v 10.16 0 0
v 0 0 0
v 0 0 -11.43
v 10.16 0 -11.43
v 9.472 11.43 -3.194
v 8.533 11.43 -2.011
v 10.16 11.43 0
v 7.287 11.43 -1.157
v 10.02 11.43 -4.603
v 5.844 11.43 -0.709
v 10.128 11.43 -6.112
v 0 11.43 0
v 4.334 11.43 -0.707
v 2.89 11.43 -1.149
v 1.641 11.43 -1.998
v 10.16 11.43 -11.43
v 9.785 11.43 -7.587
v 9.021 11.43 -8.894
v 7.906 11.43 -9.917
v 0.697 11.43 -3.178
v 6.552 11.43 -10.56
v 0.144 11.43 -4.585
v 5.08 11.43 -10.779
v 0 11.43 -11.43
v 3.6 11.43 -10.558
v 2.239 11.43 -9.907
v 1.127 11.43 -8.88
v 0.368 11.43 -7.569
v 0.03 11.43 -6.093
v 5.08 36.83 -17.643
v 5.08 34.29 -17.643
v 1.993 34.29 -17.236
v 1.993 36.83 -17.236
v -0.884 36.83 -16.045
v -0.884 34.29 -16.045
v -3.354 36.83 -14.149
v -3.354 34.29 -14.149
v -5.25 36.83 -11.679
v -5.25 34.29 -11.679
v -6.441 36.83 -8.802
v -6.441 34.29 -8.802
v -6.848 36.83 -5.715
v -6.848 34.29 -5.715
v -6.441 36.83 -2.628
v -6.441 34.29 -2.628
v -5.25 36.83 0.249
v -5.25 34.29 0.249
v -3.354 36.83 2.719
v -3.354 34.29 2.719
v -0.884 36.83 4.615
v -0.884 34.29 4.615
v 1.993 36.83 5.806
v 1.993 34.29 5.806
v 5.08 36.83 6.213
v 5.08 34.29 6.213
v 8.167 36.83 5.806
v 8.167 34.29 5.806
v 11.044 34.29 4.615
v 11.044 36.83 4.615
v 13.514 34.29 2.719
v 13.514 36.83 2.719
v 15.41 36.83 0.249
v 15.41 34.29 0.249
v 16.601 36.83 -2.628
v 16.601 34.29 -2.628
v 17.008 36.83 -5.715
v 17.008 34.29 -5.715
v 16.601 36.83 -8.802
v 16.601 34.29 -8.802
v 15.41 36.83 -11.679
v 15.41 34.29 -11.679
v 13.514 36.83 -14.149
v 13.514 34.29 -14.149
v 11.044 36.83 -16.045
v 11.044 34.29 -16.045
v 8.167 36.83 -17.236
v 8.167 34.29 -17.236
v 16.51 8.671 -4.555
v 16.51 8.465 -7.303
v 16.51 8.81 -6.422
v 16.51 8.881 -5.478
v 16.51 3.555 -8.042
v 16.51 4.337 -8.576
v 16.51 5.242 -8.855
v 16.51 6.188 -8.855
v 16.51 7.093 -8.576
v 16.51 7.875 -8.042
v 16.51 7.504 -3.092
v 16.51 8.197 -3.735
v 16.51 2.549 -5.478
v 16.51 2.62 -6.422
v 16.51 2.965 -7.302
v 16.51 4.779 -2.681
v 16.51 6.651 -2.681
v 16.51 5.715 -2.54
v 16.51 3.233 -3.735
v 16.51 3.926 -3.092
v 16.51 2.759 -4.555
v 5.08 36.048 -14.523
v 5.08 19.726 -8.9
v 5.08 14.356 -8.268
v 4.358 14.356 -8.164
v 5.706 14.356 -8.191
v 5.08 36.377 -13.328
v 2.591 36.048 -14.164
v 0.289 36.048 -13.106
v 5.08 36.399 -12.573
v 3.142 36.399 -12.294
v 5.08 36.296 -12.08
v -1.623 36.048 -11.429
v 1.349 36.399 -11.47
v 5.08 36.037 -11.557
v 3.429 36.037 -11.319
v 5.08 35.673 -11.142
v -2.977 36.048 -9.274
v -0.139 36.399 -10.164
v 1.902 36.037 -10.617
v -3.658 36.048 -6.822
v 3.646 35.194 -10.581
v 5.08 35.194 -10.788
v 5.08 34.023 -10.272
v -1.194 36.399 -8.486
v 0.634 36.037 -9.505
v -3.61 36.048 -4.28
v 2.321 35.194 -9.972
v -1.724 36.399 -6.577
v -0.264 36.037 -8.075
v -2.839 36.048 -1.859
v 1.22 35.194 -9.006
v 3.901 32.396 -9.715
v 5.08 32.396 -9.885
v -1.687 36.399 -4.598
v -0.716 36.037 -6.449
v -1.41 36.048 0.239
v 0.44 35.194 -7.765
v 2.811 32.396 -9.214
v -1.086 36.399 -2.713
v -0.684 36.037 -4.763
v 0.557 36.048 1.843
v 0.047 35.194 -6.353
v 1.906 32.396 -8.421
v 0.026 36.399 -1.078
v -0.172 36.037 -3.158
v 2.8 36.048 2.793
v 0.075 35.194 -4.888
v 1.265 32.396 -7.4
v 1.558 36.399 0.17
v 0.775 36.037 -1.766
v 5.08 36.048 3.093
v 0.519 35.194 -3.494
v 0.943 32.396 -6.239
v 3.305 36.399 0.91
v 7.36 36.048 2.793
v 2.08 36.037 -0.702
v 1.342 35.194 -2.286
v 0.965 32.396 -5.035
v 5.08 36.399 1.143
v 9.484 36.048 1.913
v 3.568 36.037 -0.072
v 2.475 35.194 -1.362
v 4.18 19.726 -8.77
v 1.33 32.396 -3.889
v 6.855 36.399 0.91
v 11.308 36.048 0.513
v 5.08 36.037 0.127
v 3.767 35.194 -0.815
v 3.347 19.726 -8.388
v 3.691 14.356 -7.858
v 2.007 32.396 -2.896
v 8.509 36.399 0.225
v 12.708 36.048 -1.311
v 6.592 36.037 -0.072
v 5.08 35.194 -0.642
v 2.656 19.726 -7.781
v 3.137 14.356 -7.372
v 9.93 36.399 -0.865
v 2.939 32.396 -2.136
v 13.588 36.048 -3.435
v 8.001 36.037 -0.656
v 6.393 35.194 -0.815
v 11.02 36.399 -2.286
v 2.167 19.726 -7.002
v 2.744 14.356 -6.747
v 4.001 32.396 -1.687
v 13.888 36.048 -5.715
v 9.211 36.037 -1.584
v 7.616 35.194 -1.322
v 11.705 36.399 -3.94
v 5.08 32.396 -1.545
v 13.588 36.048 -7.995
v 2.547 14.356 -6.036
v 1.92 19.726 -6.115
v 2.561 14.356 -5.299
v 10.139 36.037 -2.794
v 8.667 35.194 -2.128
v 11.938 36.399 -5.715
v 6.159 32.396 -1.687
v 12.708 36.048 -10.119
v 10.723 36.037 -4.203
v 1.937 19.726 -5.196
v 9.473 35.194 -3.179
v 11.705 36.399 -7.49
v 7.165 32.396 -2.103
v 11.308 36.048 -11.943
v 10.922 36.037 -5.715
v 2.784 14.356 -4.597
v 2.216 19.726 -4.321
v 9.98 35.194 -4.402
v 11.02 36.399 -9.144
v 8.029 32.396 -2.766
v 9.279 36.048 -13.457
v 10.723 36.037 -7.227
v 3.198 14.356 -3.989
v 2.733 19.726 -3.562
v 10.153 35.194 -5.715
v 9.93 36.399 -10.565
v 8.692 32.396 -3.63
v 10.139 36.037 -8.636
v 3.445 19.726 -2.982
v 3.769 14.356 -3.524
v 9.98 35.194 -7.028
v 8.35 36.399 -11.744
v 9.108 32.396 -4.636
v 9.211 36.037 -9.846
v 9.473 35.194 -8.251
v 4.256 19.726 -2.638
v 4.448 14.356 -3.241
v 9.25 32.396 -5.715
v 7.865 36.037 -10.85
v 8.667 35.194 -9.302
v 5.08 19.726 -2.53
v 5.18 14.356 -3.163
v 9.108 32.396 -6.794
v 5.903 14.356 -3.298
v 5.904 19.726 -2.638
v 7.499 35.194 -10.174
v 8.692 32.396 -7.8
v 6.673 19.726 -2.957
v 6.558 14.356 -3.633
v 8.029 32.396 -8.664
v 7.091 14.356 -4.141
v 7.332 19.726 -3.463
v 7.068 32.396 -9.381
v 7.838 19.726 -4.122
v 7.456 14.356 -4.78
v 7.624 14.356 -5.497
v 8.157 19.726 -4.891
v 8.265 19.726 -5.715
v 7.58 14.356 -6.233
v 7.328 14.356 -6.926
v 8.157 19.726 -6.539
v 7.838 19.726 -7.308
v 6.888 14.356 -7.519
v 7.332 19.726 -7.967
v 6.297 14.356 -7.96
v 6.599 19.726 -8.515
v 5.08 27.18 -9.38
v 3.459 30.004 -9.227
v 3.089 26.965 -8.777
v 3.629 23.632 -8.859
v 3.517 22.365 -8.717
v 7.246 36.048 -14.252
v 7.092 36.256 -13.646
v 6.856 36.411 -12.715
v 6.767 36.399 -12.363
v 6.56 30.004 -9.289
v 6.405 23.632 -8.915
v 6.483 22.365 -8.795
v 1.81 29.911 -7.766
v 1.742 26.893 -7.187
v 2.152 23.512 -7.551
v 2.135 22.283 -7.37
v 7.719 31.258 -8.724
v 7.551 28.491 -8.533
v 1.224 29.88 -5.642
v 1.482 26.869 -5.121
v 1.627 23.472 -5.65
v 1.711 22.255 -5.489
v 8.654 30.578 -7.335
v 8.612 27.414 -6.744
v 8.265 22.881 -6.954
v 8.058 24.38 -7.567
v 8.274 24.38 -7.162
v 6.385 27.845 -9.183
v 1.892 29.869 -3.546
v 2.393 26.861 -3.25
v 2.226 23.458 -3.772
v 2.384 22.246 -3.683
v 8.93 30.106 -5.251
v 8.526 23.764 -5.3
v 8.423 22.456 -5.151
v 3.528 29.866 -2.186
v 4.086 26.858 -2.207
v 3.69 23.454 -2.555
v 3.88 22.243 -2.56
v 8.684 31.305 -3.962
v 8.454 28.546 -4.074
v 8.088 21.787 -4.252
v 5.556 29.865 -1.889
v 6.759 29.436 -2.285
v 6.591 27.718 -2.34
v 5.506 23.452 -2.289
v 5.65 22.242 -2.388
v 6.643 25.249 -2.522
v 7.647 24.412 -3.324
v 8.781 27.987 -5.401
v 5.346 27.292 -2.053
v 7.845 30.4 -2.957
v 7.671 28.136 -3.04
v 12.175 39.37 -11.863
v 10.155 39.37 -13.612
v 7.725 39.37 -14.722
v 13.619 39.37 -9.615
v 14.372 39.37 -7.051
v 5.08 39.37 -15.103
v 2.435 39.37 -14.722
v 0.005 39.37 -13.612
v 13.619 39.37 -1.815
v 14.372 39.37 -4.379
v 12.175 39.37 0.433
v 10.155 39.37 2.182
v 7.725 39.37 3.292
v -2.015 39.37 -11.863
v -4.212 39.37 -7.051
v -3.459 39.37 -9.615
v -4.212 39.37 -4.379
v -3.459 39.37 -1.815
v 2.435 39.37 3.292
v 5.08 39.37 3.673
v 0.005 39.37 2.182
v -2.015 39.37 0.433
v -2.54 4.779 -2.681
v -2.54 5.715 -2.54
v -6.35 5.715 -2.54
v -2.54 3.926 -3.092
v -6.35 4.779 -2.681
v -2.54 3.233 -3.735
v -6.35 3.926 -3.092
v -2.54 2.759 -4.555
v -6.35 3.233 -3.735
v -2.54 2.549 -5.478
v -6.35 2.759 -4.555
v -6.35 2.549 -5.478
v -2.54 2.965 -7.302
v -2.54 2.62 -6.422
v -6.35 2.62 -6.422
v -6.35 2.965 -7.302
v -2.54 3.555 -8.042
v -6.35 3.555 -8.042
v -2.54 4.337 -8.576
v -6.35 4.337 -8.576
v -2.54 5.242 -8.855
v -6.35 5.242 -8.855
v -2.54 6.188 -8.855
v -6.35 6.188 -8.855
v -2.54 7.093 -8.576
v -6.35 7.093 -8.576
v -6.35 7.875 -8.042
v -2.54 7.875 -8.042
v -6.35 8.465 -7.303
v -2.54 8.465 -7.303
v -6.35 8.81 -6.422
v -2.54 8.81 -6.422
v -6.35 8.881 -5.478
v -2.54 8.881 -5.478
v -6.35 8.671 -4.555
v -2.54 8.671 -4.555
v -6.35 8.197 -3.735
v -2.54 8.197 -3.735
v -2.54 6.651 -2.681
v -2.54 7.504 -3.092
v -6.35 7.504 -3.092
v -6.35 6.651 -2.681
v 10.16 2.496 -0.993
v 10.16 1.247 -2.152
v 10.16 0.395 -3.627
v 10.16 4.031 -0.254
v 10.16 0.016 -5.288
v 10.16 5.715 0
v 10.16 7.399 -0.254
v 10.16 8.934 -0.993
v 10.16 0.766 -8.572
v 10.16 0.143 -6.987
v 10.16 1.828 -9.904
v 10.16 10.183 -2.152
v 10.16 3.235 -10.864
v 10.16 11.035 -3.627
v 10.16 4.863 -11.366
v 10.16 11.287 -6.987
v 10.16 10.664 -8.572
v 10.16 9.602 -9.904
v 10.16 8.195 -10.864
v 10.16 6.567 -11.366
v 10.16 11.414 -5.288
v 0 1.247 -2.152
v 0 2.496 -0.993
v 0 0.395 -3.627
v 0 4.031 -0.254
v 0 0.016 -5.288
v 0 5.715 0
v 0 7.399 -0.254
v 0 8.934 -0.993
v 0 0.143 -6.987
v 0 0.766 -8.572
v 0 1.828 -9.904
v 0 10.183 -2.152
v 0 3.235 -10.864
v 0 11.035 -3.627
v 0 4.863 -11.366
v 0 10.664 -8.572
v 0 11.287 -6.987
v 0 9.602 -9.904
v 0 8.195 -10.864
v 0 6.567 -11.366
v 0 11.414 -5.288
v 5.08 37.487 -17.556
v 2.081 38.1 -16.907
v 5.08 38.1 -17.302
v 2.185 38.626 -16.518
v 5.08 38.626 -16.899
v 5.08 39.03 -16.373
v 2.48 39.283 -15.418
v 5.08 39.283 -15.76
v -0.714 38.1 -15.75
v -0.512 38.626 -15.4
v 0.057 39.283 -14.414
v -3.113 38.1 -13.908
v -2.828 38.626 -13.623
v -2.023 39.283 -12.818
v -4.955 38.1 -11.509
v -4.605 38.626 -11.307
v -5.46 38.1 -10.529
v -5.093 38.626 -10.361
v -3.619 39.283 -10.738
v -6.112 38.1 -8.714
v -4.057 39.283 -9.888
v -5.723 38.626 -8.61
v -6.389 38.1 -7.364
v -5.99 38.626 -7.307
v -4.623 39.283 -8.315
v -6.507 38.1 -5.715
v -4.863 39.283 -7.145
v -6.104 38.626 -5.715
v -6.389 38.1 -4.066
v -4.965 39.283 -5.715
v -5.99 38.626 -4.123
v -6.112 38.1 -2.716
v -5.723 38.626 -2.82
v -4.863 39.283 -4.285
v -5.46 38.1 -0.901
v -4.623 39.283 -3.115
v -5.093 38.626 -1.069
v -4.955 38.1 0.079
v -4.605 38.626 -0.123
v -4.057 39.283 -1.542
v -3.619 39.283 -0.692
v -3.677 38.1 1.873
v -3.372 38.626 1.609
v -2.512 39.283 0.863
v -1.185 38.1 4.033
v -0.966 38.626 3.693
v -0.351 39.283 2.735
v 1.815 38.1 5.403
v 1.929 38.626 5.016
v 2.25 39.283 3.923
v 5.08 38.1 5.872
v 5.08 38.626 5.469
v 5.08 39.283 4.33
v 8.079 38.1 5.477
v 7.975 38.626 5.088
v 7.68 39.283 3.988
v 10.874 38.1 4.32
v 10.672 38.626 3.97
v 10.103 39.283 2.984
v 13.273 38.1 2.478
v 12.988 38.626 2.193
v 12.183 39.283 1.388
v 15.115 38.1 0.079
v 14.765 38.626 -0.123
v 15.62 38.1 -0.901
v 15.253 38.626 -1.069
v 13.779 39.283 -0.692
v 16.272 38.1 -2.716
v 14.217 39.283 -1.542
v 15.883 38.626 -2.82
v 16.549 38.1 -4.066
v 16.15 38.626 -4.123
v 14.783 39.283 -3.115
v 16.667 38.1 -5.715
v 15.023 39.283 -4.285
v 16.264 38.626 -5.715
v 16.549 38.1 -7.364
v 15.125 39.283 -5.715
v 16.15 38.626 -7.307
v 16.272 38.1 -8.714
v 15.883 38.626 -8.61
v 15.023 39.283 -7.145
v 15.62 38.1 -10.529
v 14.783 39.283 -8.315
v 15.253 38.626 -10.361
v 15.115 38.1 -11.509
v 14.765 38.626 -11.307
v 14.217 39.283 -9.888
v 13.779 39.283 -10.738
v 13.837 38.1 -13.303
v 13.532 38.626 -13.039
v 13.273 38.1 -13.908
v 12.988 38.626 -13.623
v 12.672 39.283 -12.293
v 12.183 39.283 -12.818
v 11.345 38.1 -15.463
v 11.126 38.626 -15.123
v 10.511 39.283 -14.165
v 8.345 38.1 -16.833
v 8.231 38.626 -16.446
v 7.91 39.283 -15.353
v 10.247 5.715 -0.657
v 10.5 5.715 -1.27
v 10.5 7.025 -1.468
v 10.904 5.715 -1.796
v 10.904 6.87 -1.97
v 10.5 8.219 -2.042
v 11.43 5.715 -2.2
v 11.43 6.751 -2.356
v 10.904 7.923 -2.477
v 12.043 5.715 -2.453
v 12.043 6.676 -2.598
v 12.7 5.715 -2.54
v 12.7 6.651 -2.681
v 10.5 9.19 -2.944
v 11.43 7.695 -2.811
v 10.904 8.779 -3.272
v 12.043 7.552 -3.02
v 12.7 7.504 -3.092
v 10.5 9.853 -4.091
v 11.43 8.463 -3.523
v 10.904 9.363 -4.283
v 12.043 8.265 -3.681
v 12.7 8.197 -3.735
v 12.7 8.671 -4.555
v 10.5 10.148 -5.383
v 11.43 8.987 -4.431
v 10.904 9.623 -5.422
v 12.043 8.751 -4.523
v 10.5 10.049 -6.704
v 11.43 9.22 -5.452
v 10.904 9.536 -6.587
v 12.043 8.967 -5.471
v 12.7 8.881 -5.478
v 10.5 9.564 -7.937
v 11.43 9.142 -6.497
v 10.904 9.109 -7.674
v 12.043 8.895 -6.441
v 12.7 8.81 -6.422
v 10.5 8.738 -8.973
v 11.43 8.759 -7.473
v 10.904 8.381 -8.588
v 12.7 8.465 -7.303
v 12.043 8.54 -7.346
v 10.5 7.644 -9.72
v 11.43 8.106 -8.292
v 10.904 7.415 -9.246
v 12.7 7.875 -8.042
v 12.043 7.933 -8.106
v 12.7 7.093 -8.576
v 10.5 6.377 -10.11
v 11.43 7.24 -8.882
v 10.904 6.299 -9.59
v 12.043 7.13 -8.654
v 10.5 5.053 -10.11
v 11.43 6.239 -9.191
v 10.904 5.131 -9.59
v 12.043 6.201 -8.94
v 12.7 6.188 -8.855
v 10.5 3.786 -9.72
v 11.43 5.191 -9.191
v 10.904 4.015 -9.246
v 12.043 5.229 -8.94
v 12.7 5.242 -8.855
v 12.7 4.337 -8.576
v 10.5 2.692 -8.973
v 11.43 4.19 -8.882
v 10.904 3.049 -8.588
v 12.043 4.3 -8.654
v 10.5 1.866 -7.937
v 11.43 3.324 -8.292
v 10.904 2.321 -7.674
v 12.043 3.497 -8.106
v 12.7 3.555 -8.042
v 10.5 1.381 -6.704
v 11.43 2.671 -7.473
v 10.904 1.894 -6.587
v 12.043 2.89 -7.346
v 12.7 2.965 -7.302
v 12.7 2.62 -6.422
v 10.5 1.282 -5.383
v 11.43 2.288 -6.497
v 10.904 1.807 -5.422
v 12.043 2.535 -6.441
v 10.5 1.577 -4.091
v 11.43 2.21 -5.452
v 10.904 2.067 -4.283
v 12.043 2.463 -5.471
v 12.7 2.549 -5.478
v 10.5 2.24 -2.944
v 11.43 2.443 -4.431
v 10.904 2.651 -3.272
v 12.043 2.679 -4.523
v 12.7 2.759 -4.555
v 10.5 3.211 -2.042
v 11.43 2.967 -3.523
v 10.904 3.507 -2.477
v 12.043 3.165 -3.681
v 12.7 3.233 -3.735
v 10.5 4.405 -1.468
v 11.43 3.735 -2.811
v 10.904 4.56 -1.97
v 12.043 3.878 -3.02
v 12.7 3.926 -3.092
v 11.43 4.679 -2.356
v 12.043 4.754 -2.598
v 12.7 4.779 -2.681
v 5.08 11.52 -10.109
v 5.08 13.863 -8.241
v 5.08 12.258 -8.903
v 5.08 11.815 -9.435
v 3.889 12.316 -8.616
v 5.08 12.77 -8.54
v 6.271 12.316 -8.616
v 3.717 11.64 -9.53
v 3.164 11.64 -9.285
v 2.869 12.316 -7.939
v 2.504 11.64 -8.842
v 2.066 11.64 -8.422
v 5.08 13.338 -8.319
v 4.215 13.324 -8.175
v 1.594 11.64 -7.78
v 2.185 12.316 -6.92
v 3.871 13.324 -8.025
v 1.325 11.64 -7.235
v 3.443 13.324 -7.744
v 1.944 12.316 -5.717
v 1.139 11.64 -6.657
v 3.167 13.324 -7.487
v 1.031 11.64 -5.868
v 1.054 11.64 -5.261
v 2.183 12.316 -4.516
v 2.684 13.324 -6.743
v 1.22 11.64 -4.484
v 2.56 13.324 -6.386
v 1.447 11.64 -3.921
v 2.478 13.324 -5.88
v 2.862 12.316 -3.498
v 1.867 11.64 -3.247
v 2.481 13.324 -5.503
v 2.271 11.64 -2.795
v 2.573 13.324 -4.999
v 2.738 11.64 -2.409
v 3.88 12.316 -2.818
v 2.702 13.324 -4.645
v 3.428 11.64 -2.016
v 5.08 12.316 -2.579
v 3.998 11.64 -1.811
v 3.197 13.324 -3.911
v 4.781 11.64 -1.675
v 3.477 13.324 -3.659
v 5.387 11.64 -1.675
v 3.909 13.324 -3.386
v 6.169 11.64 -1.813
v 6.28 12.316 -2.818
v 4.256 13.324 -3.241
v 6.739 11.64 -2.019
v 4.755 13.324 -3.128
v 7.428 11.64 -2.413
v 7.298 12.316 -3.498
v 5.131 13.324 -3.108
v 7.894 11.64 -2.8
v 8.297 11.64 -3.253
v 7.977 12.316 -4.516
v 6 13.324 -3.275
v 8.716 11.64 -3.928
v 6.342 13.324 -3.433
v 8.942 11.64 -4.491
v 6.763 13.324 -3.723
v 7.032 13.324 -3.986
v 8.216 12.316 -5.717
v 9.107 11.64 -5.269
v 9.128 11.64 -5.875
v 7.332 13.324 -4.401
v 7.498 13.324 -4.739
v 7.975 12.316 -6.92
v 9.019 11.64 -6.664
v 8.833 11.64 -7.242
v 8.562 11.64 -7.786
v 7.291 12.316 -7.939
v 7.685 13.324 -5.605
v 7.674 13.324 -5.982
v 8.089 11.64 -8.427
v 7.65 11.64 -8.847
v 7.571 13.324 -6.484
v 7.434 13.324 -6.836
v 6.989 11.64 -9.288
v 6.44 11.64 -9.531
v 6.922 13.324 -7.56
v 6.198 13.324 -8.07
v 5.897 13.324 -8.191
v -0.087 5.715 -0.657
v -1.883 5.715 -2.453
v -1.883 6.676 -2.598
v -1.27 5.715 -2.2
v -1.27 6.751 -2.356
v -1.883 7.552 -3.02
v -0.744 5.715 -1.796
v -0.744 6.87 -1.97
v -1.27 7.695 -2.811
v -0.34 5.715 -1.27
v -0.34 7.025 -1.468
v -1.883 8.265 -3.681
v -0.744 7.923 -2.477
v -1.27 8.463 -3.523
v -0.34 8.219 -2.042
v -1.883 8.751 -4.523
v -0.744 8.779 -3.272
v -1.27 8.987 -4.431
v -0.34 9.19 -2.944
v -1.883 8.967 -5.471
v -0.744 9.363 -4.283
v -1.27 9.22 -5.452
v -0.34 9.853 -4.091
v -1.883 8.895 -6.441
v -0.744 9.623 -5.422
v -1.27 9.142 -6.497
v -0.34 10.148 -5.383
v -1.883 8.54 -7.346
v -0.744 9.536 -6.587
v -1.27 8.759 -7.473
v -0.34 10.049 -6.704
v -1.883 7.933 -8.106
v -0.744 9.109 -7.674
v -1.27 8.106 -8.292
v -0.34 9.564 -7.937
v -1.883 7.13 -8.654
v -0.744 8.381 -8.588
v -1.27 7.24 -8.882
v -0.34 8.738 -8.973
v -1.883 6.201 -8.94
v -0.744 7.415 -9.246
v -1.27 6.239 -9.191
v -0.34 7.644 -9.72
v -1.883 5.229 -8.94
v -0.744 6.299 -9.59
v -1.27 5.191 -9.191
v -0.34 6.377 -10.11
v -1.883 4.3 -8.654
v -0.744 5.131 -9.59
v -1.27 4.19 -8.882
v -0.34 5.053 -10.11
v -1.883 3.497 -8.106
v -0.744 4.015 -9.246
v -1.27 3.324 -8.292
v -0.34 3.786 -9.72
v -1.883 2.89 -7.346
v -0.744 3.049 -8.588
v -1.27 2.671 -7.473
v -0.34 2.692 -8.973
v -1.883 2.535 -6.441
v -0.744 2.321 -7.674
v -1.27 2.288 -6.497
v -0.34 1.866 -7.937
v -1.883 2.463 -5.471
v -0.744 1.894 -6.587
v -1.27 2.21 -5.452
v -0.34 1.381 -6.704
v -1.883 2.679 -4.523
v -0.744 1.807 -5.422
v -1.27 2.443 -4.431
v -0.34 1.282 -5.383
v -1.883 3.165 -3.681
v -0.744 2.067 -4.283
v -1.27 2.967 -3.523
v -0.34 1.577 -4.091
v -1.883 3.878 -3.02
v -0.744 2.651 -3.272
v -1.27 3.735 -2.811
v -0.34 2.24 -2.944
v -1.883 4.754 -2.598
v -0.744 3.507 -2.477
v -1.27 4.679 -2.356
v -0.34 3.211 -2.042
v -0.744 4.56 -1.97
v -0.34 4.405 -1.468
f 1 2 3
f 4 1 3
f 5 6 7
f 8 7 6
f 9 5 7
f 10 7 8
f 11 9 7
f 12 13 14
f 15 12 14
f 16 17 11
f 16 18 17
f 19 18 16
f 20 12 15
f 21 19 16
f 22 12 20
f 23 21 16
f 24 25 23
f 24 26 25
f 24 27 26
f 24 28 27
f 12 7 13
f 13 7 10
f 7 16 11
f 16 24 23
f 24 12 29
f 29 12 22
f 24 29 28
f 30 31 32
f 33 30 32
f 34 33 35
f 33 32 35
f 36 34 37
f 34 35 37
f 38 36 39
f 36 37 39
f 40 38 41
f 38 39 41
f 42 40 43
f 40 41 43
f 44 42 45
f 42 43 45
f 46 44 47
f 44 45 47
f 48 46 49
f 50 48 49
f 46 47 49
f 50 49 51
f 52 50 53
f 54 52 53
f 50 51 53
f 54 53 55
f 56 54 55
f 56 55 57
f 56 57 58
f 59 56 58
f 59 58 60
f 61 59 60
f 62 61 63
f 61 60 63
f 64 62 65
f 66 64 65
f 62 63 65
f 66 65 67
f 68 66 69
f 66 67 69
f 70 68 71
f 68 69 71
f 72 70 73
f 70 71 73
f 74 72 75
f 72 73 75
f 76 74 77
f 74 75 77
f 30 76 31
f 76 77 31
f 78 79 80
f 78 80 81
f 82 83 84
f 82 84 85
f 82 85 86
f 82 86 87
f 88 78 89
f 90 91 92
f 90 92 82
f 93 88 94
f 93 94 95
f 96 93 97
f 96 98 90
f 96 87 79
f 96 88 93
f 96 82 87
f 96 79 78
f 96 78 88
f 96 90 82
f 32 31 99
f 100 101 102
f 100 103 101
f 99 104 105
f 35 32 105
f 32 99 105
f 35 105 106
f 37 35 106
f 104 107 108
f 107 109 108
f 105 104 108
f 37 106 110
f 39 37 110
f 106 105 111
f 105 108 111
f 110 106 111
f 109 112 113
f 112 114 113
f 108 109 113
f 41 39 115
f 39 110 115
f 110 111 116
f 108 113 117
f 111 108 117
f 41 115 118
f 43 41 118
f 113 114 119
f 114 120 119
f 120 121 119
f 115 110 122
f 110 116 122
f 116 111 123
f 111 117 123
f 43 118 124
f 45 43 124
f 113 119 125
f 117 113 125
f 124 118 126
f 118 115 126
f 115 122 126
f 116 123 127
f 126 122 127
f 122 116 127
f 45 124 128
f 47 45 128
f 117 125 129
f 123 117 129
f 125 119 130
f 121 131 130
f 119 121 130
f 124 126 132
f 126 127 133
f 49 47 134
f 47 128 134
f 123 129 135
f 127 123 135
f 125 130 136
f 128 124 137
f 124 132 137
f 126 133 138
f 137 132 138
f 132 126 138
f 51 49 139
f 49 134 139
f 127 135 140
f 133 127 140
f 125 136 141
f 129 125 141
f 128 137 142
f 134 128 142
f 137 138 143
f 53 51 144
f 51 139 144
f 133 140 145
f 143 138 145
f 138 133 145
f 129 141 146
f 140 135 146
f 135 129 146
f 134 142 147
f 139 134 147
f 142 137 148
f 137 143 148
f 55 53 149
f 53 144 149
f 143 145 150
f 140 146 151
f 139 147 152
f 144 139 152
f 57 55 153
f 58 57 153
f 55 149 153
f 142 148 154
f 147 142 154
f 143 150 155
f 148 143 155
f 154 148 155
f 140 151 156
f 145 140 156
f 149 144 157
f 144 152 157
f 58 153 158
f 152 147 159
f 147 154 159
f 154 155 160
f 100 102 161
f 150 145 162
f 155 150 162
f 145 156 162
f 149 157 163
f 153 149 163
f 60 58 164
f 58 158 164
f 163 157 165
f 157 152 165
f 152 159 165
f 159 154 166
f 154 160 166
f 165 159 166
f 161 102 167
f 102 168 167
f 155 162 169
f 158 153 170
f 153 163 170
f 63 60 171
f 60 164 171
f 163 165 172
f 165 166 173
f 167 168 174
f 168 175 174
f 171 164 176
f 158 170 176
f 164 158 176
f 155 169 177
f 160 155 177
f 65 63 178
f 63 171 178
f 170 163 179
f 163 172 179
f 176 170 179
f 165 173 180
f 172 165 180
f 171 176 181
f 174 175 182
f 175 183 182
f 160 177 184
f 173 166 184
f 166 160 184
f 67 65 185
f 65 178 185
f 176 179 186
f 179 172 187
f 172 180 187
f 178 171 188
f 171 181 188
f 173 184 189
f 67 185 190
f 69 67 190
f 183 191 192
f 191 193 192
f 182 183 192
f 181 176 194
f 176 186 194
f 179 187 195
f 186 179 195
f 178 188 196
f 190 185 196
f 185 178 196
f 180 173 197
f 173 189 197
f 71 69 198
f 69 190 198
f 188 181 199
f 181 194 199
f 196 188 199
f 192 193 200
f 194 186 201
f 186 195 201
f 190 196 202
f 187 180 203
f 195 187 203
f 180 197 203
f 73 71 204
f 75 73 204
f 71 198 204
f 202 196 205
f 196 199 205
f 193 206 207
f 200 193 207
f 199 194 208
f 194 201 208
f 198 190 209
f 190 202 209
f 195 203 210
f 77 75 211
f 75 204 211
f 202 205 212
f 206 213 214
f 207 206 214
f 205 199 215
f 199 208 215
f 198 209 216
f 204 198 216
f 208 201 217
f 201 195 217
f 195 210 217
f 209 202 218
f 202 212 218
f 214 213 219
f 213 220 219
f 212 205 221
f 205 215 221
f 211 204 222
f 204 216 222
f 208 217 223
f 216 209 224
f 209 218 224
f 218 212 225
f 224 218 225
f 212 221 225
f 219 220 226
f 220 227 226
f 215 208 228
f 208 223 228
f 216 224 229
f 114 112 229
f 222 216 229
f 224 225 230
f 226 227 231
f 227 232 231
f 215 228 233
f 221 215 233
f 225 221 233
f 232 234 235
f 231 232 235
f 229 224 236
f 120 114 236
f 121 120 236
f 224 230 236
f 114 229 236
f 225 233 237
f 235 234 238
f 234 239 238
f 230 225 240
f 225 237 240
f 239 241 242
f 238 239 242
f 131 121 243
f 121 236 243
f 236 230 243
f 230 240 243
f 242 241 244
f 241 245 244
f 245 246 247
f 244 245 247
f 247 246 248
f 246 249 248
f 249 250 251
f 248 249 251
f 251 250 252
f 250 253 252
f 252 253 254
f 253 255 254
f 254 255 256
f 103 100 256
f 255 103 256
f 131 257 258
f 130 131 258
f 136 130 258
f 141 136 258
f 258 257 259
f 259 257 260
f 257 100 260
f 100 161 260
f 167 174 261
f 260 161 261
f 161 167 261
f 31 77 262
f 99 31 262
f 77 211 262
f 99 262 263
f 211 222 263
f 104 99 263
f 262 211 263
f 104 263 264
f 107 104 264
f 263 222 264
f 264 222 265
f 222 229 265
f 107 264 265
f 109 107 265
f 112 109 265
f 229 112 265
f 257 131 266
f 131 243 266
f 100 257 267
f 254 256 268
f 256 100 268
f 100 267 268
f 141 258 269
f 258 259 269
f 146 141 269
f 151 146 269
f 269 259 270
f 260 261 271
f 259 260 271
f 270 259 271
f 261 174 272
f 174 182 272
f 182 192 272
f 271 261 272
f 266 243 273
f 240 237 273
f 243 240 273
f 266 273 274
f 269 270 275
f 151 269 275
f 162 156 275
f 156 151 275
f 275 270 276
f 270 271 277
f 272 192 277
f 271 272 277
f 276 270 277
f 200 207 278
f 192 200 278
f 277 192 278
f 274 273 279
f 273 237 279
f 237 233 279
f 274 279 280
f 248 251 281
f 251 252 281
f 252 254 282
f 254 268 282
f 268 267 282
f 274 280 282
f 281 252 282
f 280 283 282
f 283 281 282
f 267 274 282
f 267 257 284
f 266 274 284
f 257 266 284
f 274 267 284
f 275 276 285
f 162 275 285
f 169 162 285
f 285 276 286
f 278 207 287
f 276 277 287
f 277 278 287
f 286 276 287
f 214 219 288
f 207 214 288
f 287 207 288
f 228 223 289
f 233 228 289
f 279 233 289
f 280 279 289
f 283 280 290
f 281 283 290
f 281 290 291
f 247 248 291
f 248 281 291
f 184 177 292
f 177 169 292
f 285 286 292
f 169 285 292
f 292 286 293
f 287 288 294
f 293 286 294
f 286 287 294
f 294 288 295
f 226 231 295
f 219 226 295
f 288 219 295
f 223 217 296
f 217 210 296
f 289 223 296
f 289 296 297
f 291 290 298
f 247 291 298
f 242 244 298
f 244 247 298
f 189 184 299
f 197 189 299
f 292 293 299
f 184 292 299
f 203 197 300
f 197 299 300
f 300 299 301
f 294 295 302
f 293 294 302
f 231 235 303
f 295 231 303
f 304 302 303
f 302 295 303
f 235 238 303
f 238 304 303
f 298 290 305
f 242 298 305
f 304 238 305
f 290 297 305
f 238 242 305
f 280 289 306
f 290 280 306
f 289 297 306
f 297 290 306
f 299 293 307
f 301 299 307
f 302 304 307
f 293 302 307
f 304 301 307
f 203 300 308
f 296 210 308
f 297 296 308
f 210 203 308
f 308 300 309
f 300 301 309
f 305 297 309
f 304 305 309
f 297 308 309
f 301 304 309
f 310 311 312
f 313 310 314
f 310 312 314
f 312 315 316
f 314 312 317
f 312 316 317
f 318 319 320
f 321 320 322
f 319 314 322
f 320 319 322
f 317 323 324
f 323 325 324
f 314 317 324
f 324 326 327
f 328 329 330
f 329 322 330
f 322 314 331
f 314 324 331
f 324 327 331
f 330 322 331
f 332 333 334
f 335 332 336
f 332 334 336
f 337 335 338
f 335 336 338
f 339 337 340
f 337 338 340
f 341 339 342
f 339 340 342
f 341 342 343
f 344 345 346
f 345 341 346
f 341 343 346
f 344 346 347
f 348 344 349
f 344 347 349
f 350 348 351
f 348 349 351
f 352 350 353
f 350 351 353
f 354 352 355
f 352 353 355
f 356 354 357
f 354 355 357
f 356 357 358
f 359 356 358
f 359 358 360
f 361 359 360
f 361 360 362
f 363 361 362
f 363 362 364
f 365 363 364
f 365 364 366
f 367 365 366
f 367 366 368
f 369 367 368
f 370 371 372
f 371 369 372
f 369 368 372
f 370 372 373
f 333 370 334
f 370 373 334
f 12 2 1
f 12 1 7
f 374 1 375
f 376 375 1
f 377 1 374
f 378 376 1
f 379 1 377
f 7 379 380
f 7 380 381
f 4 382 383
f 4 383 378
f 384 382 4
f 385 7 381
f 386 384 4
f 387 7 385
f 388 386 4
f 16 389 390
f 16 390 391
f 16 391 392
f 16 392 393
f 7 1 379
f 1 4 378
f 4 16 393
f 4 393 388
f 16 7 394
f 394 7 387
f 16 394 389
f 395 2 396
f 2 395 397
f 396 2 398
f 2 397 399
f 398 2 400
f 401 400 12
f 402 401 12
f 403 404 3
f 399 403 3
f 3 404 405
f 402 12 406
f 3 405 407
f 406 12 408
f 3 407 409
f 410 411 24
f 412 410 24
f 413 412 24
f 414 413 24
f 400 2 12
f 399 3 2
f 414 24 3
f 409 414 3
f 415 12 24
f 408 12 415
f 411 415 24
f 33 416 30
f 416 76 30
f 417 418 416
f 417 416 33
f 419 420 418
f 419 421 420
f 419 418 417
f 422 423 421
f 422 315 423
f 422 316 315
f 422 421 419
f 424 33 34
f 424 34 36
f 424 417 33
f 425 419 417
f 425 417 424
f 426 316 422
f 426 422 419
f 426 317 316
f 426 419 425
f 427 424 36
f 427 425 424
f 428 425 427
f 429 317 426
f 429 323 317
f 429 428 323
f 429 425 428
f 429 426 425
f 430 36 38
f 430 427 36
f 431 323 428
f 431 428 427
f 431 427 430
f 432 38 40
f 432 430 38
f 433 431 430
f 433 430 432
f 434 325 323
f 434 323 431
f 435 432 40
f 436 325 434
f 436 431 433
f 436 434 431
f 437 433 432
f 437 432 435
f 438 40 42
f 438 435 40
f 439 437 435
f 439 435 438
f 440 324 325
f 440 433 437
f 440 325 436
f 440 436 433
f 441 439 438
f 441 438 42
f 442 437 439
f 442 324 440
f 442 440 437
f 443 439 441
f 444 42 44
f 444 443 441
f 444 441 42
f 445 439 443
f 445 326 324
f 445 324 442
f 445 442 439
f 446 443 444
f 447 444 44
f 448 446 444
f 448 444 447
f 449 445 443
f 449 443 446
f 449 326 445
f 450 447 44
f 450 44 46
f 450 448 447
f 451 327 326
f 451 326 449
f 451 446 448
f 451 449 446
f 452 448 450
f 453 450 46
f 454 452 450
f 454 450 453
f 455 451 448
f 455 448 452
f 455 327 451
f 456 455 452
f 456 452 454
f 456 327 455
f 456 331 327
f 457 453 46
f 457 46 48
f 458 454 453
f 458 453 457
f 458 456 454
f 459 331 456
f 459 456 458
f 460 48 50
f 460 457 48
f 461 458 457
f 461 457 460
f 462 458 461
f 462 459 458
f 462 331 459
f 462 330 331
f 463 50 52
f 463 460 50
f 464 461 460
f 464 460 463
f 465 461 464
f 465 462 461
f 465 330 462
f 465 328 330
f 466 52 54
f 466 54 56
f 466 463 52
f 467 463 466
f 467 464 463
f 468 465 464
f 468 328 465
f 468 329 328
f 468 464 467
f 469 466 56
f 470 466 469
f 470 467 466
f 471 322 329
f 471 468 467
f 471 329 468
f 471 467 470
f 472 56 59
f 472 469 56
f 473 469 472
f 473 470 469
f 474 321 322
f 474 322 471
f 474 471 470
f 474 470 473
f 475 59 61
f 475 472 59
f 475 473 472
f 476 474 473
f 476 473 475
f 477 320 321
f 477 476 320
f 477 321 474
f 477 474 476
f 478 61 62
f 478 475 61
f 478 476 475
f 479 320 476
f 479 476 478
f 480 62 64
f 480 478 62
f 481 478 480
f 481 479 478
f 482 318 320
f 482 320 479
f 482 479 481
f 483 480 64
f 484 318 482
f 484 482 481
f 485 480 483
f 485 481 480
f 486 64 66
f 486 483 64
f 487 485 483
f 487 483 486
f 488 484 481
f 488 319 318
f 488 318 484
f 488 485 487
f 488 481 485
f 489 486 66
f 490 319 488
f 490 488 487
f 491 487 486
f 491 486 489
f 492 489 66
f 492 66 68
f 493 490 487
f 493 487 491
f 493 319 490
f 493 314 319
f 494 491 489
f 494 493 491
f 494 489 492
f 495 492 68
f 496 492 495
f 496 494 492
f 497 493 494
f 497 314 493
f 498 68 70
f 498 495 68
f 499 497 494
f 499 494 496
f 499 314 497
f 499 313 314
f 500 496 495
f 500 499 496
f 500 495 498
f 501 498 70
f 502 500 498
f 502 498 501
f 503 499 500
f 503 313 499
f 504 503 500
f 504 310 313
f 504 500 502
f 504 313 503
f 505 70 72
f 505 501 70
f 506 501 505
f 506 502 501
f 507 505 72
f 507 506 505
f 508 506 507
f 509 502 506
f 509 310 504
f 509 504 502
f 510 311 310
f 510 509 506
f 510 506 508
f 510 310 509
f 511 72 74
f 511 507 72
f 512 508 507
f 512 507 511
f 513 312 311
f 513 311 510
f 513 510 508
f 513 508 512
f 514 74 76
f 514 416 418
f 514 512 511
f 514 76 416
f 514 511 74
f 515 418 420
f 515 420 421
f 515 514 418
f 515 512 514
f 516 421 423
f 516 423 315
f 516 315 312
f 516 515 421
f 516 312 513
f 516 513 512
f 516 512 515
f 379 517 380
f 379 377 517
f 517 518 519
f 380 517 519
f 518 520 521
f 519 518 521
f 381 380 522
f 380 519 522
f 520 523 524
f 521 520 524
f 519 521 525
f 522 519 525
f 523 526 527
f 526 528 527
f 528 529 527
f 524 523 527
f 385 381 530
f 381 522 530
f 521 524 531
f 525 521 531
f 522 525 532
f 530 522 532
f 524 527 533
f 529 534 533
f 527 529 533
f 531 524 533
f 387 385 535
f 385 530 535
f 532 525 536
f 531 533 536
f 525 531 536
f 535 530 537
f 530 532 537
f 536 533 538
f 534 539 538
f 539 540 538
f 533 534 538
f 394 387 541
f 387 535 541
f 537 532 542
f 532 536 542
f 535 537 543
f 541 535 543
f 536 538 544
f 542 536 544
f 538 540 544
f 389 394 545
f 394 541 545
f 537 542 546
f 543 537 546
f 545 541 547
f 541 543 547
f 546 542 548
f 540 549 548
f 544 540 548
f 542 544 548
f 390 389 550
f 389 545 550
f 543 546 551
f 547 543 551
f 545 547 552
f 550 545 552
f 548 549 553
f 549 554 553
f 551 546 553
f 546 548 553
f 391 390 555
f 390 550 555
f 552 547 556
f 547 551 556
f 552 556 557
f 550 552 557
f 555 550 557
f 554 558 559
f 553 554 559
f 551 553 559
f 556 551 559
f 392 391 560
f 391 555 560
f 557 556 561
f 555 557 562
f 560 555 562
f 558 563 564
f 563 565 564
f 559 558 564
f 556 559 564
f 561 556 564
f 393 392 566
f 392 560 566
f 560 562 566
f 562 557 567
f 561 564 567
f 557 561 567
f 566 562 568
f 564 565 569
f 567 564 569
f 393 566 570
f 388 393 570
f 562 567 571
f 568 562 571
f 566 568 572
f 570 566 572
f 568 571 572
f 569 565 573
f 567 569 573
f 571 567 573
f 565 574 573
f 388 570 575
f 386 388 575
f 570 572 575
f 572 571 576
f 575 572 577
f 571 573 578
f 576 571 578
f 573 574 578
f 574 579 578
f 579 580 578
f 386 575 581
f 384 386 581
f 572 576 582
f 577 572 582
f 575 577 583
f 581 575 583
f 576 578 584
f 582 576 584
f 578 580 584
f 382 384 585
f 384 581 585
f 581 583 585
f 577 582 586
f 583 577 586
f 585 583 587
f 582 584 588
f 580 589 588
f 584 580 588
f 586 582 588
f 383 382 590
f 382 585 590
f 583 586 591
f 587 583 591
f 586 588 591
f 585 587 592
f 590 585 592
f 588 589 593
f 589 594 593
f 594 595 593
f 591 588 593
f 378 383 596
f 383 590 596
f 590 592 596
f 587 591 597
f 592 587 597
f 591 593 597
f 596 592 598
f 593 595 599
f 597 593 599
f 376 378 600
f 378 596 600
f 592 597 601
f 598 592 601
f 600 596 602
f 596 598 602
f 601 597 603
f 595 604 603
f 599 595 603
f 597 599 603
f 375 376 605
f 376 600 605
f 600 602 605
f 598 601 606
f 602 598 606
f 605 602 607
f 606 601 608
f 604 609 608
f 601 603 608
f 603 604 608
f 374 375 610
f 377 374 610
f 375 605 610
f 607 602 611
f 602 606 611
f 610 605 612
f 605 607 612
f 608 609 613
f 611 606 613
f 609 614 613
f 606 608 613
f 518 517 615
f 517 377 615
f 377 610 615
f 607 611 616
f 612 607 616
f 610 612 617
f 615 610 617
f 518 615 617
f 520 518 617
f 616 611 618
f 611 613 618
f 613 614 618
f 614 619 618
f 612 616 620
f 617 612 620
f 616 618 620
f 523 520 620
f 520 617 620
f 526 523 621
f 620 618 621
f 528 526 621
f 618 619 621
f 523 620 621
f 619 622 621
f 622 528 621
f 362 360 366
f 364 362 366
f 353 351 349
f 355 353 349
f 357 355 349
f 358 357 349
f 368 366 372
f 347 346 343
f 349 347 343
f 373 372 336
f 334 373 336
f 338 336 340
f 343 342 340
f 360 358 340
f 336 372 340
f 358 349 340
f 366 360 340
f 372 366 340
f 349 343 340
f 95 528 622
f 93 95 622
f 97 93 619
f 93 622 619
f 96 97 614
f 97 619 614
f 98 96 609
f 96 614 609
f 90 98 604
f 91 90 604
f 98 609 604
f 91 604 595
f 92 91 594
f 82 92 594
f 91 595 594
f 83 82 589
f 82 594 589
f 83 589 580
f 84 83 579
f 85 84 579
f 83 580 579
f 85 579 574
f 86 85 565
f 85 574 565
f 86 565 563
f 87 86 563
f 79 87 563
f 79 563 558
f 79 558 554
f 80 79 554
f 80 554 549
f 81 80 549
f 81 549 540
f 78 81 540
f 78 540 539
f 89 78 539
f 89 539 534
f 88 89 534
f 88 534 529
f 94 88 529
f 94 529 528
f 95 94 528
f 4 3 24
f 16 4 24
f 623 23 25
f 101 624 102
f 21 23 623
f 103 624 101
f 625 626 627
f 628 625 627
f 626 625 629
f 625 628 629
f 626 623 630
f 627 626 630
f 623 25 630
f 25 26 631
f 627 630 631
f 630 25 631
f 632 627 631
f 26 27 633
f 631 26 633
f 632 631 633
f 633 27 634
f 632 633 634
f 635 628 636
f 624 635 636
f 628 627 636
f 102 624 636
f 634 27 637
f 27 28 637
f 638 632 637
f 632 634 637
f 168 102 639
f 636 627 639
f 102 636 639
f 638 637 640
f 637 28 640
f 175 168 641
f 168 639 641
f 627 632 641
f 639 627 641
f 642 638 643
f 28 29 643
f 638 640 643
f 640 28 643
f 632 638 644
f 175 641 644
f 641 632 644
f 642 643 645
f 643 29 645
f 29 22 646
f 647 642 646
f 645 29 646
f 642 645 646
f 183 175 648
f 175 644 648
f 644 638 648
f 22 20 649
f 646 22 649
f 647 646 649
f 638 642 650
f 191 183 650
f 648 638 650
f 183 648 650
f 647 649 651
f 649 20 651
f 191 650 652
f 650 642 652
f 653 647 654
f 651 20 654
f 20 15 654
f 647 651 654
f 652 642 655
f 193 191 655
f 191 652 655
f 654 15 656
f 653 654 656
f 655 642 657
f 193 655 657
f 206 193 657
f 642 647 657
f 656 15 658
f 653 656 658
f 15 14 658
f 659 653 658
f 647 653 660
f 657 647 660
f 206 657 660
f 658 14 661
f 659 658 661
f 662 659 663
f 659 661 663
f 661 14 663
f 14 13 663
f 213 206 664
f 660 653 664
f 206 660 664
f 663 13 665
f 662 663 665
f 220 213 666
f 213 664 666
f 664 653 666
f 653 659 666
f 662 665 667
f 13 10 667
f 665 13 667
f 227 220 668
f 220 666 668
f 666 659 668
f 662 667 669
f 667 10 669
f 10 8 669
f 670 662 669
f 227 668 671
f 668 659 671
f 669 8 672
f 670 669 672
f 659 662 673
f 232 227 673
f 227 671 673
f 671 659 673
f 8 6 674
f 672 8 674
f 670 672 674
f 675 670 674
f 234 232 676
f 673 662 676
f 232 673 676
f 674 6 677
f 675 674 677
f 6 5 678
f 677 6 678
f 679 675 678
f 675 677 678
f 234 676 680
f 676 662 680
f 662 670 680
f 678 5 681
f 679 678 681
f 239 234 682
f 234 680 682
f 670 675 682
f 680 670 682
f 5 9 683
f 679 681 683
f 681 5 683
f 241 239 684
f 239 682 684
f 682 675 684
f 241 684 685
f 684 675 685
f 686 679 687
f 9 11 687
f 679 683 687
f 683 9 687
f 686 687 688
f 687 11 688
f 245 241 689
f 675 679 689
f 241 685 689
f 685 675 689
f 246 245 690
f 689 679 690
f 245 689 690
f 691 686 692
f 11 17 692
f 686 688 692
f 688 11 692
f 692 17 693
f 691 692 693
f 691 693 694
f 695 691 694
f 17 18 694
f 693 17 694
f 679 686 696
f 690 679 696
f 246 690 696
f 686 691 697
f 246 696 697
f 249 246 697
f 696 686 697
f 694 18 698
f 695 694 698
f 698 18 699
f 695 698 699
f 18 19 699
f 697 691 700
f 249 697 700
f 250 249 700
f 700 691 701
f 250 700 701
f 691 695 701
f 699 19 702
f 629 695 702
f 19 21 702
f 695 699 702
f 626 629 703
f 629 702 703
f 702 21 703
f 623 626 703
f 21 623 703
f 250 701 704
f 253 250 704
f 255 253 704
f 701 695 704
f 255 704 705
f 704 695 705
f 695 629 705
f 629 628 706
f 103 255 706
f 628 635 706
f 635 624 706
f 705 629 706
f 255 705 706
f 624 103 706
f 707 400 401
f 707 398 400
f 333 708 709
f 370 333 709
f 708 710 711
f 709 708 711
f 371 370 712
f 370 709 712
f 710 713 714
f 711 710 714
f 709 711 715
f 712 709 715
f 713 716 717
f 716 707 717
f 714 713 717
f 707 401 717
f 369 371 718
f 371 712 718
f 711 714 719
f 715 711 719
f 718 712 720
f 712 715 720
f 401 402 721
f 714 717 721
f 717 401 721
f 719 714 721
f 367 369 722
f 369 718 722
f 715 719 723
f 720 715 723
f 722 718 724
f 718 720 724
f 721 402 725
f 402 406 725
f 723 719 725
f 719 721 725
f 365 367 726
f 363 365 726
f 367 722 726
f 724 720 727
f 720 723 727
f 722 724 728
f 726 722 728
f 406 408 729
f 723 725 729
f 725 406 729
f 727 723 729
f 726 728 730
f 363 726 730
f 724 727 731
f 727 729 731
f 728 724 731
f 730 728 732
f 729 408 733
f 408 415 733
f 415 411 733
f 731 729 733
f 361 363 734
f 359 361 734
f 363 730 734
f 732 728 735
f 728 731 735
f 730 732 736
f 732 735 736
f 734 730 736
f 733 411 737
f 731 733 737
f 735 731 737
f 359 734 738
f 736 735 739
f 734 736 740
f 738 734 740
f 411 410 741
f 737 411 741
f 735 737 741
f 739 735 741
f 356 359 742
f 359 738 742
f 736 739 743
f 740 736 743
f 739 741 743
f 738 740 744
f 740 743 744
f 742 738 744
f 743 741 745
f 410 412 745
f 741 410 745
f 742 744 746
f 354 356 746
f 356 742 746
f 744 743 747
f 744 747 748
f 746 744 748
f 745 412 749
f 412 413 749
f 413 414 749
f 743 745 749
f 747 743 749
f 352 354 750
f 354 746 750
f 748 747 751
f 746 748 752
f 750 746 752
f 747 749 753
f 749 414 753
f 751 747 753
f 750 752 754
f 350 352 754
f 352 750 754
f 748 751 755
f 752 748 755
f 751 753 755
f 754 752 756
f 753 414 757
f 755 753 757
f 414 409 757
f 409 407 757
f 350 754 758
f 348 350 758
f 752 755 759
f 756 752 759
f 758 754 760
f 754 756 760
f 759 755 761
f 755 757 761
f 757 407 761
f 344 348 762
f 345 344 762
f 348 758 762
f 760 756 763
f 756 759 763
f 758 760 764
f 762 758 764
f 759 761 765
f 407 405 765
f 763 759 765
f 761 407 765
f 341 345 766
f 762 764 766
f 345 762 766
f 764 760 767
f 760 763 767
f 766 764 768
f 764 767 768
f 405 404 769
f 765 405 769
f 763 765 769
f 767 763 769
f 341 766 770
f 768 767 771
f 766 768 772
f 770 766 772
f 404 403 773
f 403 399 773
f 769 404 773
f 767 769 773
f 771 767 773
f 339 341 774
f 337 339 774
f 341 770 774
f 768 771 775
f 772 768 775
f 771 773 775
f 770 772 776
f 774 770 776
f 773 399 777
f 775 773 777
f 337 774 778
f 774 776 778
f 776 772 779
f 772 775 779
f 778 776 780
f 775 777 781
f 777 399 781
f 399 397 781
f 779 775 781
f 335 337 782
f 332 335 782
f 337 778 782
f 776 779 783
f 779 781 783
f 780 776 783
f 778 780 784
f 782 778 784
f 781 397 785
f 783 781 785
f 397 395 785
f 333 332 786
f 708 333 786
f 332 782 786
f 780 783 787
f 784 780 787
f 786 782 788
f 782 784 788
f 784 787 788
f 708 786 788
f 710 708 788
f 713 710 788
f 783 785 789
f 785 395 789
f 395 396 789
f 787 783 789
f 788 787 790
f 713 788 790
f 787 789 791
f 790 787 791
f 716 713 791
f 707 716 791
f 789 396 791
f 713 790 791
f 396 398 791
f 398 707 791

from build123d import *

# Parameters (mm, degrees)
SKETCH2_W          = 11.43
SKETCH2_H          = 11.43
CENTRAL_BOX_DEPTH  = 10.16
NIBBLES_DEPTH      = 6.35
NIBBLES_DEPTH_BACK = 16.51
SKETCH4_R          = 3.175
YAY_ROUNDED_R      = 2.54


with BuildPart() as part:
    # Sketch2 → central box (new body)
    with BuildSketch(Plane(origin=(0, 0, 0), x_dir=(0, 0, -1), z_dir=(1, 0, 0))):
        with Locations((5.715, 5.715)):
            Rectangle(SKETCH2_W, SKETCH2_H)
    extrude(amount=CENTRAL_BOX_DEPTH)

    # Sketch4 → nibbles (add, two sides: drawn at the far end of the back side and taken through both)
    with BuildSketch(Plane(origin=(10.16, 0, 0), x_dir=(0, 0, -1), z_dir=(1, 0, 0)).offset(-NIBBLES_DEPTH_BACK)):
        with Locations(Location((5.715, 5.715, 0), (0, 0, 180))):
            Circle(SKETCH4_R)
    extrude(amount=NIBBLES_DEPTH + NIBBLES_DEPTH_BACK)

    # Sketch6 → stick (revolve)
    with BuildSketch(Plane.XY.offset(-5.715), mode=Mode.PRIVATE) as stick_sk:
        with BuildLine():
            Line((5.08, 11.43), (5.08, 39.37))
            Line((5.08, 39.37), (17.007592302, 39.37))
            Line((17.007592302, 39.37), (17.007592302, 34.29))
            add(Edge.make_bspline(
                [(17.007592302, 34.29), (5.959076516, 41.944088777), (10.418992682, 27.645249109), (7.112, 11.43)],
                knots=[0, 0, 0, 0, 1, 1, 1, 1], degree=3))
            Line((7.112, 11.43), (5.08, 11.43))
        make_face()
    revolve(stick_sk.sketch.rotate(Axis((5.08, 11.43, -5.715), (0, 1, 0)), 90), axis=Axis((5.08, 11.43, -5.715), (0, 1, 0)))

    # yay, rounded
    yay_rounded_edges = [part.edges().sort_by_distance(p)[0] for p in [
        (0, 5.715, -8.89),
        (10.16, 5.715, -8.89),
        (5.08, 11.43, -3.683),
        (5.08, 39.37, 6.212592302),
    ]]
    fillet(yay_rounded_edges, radius=YAY_ROUNDED_R - 0.0001)  # a hair under: the kernel refuses the full size


solid = part.part
